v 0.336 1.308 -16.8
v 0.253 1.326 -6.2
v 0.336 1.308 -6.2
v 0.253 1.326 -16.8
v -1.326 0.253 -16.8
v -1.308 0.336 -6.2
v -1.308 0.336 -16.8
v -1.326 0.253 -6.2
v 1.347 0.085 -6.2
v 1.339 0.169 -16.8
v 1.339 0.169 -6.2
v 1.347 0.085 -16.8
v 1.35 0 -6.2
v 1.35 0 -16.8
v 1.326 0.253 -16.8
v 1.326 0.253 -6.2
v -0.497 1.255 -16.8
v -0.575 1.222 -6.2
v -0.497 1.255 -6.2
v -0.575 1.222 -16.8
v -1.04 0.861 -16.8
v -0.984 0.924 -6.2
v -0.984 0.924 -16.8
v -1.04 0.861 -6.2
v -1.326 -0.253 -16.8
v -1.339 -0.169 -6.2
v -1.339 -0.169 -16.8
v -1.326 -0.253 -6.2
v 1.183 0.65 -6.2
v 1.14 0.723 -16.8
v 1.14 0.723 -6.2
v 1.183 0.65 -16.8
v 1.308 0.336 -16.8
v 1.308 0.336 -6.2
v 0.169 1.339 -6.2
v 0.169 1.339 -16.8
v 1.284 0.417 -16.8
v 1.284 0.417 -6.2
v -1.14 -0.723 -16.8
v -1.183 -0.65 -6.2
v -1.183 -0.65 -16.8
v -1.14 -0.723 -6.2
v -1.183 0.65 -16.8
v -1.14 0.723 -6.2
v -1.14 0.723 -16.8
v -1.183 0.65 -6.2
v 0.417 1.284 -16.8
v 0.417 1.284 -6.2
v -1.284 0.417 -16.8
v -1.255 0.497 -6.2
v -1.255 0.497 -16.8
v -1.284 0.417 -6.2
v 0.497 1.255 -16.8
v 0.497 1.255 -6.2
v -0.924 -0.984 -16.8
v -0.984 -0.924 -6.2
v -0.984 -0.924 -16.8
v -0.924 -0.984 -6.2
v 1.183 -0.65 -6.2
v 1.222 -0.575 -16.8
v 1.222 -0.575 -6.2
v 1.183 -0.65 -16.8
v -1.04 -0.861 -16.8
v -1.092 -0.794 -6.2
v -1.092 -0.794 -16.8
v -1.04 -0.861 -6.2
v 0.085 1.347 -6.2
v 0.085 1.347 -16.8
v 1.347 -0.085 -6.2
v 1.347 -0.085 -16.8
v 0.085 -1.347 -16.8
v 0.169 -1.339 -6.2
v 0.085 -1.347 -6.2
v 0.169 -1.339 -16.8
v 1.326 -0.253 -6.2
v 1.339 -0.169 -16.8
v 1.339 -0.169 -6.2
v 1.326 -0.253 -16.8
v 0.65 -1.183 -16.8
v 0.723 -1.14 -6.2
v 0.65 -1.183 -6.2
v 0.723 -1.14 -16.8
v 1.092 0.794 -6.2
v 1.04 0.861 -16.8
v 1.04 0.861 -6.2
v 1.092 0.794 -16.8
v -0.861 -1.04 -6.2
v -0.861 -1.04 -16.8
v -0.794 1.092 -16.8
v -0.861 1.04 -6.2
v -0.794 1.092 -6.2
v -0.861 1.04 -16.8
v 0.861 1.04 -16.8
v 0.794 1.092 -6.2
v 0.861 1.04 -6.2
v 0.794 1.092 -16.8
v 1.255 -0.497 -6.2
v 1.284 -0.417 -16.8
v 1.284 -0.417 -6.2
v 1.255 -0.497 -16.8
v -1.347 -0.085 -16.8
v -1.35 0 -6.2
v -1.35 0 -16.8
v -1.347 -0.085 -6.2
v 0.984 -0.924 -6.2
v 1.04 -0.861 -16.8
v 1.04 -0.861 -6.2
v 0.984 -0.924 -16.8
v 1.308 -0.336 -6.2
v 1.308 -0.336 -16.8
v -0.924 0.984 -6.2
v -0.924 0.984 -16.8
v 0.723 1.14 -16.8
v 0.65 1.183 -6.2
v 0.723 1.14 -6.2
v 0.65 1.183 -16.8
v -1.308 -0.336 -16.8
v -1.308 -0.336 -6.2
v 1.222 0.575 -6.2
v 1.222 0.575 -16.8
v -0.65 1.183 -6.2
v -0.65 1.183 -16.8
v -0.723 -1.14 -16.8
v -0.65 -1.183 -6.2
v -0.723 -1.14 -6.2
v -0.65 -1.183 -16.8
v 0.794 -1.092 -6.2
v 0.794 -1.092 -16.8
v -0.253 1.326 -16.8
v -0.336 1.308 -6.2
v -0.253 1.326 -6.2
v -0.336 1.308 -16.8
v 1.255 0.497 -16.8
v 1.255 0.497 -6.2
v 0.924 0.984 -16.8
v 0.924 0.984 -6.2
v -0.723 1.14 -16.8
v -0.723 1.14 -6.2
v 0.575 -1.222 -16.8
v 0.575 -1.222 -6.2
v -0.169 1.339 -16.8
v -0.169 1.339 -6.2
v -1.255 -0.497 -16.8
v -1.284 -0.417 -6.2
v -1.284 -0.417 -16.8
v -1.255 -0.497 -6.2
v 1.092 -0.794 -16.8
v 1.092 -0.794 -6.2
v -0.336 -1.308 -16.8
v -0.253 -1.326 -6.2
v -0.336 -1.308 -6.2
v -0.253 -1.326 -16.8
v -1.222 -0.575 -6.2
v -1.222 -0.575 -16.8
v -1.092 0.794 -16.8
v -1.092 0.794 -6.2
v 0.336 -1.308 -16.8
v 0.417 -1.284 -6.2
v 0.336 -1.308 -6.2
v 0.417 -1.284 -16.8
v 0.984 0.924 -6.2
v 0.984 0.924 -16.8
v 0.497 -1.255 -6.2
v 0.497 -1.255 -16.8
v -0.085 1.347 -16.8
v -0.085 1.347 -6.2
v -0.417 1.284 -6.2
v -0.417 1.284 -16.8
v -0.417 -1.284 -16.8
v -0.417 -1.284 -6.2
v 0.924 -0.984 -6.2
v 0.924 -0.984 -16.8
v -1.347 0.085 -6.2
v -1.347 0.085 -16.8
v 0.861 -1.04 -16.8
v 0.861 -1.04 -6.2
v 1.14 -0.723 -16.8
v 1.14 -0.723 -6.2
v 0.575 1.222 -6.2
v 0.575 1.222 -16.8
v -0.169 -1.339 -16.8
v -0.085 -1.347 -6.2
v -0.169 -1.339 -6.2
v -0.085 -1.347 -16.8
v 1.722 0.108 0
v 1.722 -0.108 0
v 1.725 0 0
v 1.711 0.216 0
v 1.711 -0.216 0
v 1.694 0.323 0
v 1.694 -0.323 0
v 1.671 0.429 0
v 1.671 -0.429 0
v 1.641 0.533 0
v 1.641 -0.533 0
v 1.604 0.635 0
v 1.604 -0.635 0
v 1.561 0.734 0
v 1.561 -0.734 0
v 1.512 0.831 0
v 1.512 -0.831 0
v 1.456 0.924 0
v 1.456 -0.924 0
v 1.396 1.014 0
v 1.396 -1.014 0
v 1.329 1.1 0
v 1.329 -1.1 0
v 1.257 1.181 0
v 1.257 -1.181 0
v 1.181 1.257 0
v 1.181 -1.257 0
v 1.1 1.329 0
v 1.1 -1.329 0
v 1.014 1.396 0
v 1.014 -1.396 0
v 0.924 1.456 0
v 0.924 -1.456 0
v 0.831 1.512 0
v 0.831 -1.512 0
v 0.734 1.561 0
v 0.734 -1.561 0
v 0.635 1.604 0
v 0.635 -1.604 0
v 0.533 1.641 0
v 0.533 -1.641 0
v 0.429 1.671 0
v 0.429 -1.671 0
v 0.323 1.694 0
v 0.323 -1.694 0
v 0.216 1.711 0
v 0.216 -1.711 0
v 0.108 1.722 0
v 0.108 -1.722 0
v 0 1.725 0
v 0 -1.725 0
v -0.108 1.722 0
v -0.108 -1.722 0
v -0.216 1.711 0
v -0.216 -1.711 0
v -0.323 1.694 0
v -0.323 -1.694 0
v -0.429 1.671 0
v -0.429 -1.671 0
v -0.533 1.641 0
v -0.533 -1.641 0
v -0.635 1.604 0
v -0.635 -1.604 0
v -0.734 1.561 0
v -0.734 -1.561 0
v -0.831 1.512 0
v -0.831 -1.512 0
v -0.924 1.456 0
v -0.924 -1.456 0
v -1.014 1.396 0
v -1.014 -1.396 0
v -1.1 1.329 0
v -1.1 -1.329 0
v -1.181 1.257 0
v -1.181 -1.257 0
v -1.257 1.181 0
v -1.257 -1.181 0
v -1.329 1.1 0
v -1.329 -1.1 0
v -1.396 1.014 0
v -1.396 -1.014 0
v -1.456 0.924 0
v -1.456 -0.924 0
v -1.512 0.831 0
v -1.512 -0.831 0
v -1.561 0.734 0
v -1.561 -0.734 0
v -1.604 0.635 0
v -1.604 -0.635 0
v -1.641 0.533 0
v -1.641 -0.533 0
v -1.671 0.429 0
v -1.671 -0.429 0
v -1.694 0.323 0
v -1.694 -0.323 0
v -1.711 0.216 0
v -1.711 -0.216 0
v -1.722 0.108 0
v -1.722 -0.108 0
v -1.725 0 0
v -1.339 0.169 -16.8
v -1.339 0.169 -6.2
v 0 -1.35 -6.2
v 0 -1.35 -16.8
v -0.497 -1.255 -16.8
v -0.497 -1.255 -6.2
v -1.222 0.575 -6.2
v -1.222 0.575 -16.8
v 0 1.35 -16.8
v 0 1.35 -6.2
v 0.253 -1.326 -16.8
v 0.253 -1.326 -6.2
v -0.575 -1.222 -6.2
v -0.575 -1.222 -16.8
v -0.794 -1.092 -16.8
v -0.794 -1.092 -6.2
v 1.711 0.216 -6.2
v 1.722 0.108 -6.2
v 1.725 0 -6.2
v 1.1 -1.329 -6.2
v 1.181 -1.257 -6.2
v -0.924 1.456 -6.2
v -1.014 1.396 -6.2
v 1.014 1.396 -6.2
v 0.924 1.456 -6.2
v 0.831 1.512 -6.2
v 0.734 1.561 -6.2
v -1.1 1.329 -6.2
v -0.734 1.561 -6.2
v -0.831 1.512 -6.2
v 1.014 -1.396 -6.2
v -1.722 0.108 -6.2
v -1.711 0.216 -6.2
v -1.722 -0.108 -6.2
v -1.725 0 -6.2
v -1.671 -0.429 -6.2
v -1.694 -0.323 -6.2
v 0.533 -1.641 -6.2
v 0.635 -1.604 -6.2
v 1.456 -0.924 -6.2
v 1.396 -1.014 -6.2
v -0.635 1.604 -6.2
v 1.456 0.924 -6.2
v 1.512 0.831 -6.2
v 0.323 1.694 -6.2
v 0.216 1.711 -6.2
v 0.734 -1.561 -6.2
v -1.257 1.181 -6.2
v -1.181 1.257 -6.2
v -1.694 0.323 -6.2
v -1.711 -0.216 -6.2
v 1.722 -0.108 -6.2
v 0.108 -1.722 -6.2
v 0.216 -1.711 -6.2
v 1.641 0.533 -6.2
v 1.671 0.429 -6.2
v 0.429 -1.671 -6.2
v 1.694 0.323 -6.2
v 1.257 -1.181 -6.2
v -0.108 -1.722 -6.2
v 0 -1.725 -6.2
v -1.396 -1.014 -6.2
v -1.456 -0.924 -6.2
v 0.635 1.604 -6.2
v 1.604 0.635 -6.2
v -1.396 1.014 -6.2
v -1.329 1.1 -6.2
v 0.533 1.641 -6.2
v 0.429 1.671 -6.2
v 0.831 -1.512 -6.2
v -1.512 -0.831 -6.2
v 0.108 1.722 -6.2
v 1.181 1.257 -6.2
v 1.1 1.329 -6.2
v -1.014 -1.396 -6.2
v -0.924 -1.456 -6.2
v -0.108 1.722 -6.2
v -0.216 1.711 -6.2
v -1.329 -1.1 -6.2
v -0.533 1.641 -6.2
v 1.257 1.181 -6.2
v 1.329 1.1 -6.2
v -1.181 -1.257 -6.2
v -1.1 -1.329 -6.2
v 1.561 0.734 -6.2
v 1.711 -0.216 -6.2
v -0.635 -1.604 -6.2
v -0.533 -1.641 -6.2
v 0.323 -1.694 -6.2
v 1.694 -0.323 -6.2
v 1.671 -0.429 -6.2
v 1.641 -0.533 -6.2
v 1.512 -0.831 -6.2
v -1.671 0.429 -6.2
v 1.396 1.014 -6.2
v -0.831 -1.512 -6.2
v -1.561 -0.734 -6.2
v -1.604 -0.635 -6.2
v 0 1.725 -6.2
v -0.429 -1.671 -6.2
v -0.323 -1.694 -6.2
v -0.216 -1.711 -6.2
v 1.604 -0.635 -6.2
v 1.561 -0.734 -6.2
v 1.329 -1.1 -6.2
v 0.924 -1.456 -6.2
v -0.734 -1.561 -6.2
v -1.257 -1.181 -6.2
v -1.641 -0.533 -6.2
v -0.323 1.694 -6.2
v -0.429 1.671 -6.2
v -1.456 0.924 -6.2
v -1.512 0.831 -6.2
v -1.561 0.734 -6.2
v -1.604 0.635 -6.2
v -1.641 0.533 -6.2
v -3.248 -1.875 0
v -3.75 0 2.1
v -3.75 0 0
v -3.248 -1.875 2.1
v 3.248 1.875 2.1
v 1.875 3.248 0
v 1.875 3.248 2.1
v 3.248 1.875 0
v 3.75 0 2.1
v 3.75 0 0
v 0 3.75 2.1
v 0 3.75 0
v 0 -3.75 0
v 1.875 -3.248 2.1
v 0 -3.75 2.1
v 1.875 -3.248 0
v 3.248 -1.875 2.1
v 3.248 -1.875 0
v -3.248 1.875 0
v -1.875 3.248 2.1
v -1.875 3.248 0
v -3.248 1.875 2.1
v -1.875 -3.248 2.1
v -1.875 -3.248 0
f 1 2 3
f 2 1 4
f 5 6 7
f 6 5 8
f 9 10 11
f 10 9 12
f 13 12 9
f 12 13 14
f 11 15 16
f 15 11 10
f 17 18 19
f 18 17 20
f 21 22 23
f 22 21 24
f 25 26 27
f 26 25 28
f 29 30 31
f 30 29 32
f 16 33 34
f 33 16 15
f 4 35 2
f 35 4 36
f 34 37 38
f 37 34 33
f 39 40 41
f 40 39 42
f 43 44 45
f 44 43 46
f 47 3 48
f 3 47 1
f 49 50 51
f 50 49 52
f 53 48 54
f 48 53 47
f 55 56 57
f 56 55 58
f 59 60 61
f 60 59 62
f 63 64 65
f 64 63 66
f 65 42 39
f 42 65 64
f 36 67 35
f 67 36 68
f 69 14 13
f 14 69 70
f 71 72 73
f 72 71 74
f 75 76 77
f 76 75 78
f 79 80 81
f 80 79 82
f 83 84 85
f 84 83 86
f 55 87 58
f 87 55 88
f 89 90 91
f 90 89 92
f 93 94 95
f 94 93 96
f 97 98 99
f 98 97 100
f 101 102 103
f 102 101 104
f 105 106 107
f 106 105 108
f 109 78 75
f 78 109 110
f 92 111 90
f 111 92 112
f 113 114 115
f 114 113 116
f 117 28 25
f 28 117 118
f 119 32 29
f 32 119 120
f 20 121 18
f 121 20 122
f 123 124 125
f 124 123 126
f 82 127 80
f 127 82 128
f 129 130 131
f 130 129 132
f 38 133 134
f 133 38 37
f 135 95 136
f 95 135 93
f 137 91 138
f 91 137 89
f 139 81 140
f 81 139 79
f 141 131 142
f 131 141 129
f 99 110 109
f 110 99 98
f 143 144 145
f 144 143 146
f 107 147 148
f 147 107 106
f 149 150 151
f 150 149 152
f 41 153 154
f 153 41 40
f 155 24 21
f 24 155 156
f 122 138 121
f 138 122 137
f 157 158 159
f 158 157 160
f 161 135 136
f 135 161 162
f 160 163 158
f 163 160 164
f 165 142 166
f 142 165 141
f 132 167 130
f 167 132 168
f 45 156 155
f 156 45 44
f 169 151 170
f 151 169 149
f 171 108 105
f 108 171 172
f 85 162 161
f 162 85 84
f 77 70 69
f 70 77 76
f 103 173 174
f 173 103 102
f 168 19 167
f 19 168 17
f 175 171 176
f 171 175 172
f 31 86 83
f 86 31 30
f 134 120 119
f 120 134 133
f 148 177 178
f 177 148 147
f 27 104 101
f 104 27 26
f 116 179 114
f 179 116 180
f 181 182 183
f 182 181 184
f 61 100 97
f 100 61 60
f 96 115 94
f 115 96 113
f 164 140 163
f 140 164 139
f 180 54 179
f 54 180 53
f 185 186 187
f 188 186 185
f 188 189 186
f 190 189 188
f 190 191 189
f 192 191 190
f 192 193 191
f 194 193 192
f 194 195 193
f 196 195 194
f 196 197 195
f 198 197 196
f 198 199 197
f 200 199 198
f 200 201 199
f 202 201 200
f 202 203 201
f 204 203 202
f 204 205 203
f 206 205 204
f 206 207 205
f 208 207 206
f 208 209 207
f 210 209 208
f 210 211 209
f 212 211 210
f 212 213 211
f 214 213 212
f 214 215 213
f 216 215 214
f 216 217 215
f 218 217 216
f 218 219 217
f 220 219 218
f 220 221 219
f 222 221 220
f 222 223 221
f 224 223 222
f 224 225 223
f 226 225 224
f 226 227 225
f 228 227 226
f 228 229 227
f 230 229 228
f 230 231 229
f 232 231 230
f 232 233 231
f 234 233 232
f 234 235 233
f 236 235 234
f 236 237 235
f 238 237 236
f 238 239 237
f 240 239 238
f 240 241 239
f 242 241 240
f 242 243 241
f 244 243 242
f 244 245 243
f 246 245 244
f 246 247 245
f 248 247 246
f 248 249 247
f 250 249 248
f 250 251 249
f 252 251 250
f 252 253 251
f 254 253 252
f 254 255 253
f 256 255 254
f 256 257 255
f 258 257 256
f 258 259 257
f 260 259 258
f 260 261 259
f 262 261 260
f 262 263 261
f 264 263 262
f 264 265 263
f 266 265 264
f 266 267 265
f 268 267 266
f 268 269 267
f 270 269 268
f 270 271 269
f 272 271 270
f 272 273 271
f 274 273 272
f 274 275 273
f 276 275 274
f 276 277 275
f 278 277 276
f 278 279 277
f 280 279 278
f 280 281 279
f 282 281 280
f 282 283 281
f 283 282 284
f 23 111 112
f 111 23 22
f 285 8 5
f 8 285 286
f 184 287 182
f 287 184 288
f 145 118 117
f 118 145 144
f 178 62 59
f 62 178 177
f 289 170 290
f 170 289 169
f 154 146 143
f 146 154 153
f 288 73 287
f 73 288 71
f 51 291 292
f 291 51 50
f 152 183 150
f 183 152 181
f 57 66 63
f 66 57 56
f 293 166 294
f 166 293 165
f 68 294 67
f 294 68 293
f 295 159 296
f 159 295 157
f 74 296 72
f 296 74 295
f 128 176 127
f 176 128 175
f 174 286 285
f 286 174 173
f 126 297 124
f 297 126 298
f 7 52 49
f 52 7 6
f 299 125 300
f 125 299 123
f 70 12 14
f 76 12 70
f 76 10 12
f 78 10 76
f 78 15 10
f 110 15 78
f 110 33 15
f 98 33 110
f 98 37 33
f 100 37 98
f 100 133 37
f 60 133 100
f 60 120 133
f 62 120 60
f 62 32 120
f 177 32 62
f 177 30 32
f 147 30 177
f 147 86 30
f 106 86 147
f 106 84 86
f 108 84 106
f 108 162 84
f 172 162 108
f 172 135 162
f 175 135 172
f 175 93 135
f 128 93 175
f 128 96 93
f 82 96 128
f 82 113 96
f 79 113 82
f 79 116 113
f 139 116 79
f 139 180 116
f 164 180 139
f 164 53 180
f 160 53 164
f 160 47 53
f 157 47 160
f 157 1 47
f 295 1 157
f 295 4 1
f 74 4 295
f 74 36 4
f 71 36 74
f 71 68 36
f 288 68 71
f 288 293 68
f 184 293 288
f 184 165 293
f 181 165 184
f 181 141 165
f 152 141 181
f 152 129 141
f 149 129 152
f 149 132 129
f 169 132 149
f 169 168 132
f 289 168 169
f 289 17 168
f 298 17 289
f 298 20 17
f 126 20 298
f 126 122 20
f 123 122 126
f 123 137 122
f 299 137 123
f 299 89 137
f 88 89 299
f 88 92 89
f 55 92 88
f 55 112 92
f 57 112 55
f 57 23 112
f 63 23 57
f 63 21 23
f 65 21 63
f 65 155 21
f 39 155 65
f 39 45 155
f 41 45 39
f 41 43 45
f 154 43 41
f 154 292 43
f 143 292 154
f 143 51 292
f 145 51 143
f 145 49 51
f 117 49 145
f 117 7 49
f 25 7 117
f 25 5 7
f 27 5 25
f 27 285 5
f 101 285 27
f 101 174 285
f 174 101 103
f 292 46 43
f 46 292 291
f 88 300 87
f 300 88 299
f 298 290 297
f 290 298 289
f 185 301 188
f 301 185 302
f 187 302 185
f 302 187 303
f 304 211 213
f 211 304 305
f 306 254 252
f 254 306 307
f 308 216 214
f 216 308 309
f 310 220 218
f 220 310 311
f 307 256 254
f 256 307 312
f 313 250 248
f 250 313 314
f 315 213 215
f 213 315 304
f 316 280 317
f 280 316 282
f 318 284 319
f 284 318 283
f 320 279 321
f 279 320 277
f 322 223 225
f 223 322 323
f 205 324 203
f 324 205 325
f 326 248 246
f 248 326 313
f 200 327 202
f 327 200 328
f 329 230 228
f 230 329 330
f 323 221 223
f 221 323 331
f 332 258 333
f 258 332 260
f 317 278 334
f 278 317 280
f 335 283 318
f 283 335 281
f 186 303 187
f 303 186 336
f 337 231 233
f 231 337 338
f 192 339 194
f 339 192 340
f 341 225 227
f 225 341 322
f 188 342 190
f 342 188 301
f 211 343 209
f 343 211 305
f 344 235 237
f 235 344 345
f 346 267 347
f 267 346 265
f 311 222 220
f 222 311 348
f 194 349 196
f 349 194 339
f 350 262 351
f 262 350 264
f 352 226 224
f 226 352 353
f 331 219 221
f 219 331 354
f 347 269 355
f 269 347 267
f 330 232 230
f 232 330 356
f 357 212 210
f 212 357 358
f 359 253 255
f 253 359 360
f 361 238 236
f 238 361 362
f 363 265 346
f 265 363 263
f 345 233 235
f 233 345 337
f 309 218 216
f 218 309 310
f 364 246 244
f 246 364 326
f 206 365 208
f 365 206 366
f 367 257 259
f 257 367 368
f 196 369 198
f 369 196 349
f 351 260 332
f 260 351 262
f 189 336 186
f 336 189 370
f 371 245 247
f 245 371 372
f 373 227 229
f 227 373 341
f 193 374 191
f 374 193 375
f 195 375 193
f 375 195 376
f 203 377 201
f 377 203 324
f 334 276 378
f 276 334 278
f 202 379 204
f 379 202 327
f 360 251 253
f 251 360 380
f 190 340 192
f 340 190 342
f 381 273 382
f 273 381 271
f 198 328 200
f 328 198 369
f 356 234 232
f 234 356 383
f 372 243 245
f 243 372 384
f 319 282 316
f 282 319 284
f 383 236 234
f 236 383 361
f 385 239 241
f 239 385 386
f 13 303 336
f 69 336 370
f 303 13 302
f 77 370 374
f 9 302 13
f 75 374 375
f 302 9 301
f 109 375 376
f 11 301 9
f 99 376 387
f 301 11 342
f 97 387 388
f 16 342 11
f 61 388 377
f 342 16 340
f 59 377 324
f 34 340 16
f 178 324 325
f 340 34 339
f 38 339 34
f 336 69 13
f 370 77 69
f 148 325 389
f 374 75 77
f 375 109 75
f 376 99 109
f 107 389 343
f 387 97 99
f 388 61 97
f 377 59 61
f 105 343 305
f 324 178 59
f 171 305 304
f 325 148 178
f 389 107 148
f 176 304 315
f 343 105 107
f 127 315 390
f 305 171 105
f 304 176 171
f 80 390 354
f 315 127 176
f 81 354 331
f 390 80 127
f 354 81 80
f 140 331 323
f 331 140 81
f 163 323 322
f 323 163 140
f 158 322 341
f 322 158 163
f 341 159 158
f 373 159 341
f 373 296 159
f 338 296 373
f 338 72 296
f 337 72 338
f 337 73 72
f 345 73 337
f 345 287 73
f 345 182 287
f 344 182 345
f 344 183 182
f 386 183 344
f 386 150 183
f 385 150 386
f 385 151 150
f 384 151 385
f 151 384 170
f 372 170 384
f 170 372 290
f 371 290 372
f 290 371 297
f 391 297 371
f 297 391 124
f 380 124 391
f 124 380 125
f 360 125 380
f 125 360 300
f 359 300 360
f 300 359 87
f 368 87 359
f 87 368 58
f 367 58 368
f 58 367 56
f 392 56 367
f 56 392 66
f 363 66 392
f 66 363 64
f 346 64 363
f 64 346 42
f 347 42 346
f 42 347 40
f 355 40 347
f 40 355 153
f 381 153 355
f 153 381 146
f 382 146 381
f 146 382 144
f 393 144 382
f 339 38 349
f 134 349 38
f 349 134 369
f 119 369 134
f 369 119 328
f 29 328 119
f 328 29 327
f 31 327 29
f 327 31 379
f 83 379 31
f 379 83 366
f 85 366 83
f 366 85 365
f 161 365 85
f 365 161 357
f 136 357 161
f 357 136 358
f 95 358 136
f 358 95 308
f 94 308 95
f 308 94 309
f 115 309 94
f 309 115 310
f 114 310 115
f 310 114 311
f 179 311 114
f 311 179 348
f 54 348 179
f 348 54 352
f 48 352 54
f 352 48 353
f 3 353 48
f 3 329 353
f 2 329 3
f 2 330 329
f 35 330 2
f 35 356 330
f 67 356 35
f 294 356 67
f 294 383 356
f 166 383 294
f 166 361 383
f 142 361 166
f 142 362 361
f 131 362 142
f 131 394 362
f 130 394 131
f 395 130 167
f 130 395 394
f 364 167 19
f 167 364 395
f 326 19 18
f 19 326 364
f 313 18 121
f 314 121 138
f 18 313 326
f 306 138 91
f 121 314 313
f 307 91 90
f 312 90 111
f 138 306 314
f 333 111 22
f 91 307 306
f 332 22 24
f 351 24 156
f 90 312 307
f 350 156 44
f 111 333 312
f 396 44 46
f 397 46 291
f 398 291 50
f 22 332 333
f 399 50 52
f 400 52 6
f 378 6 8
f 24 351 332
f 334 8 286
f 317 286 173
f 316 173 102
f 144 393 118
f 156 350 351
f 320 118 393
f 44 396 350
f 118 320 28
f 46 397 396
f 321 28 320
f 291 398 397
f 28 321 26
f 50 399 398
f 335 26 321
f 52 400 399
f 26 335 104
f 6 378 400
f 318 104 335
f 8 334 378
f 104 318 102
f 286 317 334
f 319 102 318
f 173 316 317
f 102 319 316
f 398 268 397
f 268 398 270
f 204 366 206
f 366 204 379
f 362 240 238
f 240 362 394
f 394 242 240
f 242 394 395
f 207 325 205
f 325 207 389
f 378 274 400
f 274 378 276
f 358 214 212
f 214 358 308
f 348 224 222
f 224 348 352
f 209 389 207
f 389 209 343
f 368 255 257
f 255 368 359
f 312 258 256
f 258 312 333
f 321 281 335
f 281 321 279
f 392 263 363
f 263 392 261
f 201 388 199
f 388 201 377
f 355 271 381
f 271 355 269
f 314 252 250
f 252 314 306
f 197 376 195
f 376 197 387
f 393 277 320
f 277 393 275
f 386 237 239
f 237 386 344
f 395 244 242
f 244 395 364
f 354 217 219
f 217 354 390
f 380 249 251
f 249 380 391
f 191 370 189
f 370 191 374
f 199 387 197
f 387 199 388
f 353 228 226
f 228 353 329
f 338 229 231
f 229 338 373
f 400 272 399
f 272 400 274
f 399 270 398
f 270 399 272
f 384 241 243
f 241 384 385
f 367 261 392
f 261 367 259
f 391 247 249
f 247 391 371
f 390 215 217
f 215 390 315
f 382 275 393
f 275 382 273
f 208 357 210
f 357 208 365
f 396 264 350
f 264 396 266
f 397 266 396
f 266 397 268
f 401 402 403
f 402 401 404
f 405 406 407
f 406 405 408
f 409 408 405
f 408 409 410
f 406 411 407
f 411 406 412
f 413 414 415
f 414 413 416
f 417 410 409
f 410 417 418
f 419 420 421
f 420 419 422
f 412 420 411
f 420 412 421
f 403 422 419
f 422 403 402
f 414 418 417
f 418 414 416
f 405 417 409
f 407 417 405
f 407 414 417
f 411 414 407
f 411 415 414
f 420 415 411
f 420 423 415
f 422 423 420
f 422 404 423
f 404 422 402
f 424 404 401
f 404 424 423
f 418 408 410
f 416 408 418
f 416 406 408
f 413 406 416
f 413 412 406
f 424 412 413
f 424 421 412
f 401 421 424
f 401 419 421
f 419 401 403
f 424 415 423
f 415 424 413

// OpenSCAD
//This is modelling a motor screw being used as a bolt, and it's got a thicker bit so that it can slide through one side of the grip and then grab onto the other

function MotorScrewBoltOuterDiameter(3dPrinterTolerance=.4) = 2.65 + 3dPrinterTolerance*2;
function MotorScrewBoltDiameter(3dPrinterTolerance=.4)= 1.9 + 3dPrinterTolerance*2;
function MotorScrewBoltLength(3dPrinterTolerance=.4)= 16.4 + 3dPrinterTolerance;
function MotorScrewBoltHeadDiameter(3dPrinterTolerance=.4)= 6.7 + 3dPrinterTolerance*2;
function MotorScrewBoltHeadHeight(3dPrinterTolerance=.4)= 1.7 + 3dPrinterTolerance;

//err on the side of larger tolerances for bolts

module MotorScrewBolt(3dPrinterTolerance=.4, PlasticWidth=4.2)
{
	union()
	{
		translate([0,0,-MotorScrewBoltLength(3dPrinterTolerance)])
		{
			union()
			{
				cylinder(h=MotorScrewBoltLength(3dPrinterTolerance),r=MotorScrewBoltDiameter(3dPrinterTolerance)/2, $fn=100);
				translate([0,0,MotorScrewBoltLength(3dPrinterTolerance)-(PlasticWidth+2)])
				{
					cylinder(h=PlasticWidth+2, r=MotorScrewBoltOuterDiameter(3dPrinterTolerance)/2, $fn=100);
				}
			}
		}
		cylinder(MotorScrewBoltHeadHeight(3dPrinterTolerance), MotorScrewBoltHeadDiameter(3dPrinterTolerance)/2,MotorScrewBoltHeadDiameter(3dPrinterTolerance)/2);
	}
}



MotorScrewBolt(.4,4.2);
